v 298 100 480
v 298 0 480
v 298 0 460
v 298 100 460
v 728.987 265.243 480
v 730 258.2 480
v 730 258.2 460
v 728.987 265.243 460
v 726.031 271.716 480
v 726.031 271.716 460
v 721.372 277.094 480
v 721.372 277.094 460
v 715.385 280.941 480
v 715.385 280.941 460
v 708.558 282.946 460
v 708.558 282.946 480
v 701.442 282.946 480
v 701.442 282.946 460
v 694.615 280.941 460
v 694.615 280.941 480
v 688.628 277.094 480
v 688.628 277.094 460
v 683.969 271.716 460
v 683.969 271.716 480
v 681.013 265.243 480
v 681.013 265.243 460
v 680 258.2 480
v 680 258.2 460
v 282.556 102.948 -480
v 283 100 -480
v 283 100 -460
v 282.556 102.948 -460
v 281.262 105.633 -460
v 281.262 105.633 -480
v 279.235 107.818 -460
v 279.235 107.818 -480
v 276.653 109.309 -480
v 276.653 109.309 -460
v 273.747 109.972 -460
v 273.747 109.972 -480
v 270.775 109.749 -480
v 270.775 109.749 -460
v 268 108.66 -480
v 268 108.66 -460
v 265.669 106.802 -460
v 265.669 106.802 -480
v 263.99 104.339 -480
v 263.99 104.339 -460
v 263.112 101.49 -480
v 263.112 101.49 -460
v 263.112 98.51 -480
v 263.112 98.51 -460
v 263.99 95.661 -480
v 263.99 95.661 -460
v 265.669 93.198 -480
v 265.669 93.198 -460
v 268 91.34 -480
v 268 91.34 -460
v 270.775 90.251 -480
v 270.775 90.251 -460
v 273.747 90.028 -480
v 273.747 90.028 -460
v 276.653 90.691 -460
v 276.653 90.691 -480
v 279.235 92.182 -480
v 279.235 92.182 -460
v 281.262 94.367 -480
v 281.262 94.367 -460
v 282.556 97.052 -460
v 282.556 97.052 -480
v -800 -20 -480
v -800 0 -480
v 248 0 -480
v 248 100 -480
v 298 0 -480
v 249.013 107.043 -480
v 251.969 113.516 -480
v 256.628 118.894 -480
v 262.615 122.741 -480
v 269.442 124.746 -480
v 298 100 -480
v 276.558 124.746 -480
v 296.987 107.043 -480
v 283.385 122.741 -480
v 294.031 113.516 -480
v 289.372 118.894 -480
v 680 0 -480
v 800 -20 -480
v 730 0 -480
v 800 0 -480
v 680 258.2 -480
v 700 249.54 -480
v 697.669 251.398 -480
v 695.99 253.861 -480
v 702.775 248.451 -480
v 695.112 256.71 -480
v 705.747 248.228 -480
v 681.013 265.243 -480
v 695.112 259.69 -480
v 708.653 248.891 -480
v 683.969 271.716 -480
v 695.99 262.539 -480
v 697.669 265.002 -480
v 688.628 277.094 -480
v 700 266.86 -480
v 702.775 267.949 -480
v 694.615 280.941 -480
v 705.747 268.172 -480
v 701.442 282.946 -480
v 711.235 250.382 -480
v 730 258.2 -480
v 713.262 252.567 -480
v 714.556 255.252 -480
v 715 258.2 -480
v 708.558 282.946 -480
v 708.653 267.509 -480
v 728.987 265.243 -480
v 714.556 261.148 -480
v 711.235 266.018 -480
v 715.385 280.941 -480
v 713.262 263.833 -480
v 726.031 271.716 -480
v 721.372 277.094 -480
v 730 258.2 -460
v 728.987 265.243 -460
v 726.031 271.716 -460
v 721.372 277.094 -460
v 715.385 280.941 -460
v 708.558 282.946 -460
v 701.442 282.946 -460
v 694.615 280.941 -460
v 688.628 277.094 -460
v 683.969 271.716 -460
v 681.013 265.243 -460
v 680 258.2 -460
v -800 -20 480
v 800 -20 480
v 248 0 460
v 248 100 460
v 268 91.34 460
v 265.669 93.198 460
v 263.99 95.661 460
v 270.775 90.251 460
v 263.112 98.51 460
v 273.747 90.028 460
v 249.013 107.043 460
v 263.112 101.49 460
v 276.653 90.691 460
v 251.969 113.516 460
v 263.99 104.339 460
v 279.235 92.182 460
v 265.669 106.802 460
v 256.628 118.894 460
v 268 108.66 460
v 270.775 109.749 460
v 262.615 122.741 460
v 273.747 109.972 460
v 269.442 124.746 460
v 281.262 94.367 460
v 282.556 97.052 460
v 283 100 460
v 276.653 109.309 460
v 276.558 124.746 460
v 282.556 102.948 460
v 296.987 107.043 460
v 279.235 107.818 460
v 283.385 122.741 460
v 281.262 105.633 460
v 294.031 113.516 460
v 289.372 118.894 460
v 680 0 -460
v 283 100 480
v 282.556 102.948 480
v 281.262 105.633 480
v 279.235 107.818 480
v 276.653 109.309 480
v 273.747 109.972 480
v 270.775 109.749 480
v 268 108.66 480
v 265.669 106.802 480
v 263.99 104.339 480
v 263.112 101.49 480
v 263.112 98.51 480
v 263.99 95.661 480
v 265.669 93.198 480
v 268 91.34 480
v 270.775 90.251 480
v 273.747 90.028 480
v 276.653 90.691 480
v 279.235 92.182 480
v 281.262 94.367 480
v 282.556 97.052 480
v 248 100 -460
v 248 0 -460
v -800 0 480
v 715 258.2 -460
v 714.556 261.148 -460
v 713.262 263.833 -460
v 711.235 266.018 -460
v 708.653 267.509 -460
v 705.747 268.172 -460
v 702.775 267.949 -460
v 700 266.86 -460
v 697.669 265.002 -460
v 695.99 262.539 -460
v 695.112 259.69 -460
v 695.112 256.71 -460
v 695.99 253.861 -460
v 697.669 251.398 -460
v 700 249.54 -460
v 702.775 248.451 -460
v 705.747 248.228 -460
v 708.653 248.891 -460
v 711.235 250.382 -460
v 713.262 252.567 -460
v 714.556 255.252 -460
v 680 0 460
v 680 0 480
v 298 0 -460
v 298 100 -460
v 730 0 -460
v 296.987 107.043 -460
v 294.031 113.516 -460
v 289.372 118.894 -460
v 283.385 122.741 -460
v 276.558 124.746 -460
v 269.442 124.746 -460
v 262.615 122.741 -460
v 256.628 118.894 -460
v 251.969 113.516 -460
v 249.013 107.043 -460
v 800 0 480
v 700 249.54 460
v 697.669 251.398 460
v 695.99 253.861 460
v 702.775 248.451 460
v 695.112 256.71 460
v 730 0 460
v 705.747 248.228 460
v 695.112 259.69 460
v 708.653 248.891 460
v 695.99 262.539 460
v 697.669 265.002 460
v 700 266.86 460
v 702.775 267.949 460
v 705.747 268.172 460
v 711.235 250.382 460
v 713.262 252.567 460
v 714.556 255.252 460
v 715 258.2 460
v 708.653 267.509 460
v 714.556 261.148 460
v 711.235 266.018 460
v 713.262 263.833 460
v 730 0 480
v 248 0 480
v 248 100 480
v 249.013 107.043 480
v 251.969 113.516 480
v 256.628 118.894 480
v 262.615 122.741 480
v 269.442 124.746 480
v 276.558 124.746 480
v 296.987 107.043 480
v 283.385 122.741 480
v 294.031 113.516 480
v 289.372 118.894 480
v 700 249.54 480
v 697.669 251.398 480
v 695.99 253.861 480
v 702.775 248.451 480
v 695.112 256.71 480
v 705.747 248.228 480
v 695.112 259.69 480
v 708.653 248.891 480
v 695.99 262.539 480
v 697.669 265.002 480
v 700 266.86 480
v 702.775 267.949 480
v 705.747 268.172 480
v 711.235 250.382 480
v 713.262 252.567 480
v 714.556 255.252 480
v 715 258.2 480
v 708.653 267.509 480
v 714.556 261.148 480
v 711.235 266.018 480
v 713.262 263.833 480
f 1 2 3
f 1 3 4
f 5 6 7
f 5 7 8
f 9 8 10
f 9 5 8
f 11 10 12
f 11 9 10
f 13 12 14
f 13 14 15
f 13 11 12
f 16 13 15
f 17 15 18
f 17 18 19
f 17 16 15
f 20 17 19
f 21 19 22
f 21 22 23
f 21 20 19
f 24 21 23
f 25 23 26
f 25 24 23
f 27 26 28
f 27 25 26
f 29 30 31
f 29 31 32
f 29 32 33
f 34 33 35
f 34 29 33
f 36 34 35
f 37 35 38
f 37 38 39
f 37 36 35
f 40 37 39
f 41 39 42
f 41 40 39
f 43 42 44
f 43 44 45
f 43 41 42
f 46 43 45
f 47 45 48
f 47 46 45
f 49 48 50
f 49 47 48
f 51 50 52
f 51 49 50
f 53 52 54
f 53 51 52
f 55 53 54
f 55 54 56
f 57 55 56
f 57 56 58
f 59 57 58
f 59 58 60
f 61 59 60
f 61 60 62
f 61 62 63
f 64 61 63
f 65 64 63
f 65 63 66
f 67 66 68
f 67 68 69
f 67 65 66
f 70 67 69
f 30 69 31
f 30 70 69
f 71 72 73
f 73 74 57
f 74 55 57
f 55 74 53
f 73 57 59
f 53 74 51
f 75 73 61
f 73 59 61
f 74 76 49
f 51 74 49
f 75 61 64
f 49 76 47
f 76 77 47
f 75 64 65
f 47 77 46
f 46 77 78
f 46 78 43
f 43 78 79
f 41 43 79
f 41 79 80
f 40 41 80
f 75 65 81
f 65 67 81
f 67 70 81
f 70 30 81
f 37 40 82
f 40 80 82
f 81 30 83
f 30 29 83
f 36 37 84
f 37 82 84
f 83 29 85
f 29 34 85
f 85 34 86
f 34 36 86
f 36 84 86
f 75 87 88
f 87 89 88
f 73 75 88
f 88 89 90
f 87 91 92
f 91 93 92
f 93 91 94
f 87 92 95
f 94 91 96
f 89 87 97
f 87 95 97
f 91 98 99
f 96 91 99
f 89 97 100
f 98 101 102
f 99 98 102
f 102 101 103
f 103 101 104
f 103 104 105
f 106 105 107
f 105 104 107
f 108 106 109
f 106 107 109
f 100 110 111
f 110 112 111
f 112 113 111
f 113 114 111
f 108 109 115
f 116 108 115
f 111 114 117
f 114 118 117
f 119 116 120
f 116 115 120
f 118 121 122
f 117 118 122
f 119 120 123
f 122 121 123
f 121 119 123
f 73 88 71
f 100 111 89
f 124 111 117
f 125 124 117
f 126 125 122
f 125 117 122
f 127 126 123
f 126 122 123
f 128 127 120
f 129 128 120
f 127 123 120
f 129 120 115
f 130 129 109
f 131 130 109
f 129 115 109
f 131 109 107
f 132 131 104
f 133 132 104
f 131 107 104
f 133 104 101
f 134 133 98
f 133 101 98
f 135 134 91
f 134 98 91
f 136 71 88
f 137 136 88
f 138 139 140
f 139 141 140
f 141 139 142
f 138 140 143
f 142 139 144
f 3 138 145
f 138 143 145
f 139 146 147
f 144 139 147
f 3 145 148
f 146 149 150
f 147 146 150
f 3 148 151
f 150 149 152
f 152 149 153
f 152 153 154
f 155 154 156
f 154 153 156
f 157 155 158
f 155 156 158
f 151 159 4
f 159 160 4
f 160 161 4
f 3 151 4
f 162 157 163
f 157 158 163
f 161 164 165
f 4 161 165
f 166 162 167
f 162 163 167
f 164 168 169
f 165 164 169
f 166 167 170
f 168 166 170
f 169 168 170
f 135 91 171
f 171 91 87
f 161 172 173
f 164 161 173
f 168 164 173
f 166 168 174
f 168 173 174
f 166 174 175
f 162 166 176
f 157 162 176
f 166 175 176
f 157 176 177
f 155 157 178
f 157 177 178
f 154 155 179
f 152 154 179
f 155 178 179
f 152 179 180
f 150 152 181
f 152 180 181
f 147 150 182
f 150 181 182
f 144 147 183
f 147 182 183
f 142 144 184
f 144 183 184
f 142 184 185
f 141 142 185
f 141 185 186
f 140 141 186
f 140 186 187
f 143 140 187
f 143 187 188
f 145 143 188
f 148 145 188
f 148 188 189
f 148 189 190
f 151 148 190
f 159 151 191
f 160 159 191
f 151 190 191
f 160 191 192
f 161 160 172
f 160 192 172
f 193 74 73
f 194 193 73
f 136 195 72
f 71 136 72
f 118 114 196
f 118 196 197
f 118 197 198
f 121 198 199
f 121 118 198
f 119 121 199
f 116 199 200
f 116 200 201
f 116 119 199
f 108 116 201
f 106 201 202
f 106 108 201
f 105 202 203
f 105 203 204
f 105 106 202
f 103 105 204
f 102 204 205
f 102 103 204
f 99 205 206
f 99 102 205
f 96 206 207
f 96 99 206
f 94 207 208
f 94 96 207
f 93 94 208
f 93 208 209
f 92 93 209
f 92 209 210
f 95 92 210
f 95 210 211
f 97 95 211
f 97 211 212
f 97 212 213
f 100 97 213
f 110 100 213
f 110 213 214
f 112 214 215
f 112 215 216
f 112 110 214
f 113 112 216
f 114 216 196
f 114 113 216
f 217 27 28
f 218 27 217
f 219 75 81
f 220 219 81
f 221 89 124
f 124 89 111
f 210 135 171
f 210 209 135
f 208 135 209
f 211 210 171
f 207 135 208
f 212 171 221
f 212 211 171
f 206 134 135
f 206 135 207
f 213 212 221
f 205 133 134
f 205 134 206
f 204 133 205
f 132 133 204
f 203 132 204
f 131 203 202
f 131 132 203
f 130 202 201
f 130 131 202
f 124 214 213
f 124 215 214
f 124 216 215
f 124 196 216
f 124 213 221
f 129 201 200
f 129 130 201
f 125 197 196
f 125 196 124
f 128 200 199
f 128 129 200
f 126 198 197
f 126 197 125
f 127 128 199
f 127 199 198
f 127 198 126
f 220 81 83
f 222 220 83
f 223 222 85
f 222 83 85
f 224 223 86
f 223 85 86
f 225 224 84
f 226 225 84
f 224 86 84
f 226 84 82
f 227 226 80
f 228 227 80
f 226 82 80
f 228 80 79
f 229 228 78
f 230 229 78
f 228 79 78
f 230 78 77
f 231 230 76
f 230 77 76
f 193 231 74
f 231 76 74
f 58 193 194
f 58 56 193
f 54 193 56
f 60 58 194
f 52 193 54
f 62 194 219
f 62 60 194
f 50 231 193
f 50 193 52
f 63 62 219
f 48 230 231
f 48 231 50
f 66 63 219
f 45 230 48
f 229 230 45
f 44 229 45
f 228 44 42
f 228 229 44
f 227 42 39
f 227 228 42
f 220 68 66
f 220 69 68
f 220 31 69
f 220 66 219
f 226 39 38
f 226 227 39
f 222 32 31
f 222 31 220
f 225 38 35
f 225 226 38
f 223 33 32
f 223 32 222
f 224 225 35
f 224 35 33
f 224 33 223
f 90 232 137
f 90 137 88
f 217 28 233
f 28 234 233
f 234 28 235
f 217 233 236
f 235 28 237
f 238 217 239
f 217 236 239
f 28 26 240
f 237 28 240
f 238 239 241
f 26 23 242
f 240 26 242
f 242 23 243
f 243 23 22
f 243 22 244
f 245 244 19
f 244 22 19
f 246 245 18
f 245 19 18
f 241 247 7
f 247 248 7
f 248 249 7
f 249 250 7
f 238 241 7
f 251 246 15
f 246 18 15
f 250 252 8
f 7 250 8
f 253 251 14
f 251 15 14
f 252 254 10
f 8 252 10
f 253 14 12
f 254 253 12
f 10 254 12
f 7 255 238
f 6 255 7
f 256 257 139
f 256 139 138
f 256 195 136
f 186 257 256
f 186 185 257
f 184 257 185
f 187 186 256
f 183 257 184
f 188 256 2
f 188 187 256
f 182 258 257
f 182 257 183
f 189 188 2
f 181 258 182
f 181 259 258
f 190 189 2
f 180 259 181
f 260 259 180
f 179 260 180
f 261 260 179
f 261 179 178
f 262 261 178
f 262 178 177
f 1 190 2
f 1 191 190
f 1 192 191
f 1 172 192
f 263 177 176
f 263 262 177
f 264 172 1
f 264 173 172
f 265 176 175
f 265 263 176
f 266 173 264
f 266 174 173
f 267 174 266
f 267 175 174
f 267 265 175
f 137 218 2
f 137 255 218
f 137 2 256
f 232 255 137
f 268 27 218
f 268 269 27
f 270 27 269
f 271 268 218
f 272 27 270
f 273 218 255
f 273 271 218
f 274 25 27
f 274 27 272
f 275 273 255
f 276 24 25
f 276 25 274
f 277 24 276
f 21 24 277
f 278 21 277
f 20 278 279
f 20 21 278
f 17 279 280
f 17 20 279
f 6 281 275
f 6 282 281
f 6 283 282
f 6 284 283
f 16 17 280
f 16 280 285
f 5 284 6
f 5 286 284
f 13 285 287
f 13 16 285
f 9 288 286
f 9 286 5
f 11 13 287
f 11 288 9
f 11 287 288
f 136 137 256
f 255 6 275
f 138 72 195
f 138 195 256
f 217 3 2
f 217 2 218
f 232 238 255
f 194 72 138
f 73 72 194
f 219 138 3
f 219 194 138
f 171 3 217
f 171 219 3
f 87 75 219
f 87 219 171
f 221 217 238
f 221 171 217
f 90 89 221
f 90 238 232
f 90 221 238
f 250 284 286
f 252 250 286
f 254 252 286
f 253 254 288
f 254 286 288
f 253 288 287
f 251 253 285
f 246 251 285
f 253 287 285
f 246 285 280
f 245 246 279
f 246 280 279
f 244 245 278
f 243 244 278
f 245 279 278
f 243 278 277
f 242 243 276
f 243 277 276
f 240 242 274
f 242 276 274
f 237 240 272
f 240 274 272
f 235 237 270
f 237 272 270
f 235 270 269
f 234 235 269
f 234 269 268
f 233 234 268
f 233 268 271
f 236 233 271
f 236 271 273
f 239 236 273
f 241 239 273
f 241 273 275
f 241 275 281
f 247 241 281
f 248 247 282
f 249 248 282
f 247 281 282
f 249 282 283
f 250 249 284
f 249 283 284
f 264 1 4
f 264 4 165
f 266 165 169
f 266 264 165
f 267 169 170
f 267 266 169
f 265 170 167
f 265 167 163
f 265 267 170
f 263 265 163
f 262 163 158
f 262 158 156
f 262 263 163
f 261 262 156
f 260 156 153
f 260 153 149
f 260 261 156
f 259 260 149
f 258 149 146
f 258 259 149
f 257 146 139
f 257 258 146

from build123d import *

# Parameters (mm, degrees)
SKETCH1_W           = 1600
SKETCH1_H           = 960
BOSS_EXTRUDE1_DEPTH = 20
SKETCH2_R           = 10
BOSS_EXTRUDE2_DEPTH = 20


with BuildPart() as part:
    # Sketch1 → Boss-Extrude1 (new body)
    with BuildSketch(Plane(origin=(0, 0, 0), x_dir=(1, 0, 0), z_dir=(0, 1, 0))):
        Rectangle(SKETCH1_W, SKETCH1_H)
    extrude(amount=-BOSS_EXTRUDE1_DEPTH)

    # Sketch2 → Boss-Extrude2 (add)
    with BuildSketch(Plane.XY.offset(480)):
        with BuildLine():
            Line((248, 0), (298, 0))
            Line((298, 0), (298, 100))
            ThreePointArc((298, 100), (273, 125), (248, 100))
            Line((248, 100), (248, 0))
        make_face()
        with Locations((273, 100)):
            Circle(SKETCH2_R, mode=Mode.SUBTRACT)
        with BuildLine():
            Line((680, 258.2), (680, 0))
            Line((680, 0), (730, 0))
            Line((730, 0), (730, 258.2))
            ThreePointArc((730, 258.2), (705, 283.2), (680, 258.2))
        make_face()
        with Locations((705, 258.2)):
            Circle(SKETCH2_R, mode=Mode.SUBTRACT)
    extrude(amount=-BOSS_EXTRUDE2_DEPTH)

    # Mirror1: part across plane


with BuildPart() as part_1:
    add(part.part)
    add(part.part.mirror(Plane.XY))


solid = part_1.part
